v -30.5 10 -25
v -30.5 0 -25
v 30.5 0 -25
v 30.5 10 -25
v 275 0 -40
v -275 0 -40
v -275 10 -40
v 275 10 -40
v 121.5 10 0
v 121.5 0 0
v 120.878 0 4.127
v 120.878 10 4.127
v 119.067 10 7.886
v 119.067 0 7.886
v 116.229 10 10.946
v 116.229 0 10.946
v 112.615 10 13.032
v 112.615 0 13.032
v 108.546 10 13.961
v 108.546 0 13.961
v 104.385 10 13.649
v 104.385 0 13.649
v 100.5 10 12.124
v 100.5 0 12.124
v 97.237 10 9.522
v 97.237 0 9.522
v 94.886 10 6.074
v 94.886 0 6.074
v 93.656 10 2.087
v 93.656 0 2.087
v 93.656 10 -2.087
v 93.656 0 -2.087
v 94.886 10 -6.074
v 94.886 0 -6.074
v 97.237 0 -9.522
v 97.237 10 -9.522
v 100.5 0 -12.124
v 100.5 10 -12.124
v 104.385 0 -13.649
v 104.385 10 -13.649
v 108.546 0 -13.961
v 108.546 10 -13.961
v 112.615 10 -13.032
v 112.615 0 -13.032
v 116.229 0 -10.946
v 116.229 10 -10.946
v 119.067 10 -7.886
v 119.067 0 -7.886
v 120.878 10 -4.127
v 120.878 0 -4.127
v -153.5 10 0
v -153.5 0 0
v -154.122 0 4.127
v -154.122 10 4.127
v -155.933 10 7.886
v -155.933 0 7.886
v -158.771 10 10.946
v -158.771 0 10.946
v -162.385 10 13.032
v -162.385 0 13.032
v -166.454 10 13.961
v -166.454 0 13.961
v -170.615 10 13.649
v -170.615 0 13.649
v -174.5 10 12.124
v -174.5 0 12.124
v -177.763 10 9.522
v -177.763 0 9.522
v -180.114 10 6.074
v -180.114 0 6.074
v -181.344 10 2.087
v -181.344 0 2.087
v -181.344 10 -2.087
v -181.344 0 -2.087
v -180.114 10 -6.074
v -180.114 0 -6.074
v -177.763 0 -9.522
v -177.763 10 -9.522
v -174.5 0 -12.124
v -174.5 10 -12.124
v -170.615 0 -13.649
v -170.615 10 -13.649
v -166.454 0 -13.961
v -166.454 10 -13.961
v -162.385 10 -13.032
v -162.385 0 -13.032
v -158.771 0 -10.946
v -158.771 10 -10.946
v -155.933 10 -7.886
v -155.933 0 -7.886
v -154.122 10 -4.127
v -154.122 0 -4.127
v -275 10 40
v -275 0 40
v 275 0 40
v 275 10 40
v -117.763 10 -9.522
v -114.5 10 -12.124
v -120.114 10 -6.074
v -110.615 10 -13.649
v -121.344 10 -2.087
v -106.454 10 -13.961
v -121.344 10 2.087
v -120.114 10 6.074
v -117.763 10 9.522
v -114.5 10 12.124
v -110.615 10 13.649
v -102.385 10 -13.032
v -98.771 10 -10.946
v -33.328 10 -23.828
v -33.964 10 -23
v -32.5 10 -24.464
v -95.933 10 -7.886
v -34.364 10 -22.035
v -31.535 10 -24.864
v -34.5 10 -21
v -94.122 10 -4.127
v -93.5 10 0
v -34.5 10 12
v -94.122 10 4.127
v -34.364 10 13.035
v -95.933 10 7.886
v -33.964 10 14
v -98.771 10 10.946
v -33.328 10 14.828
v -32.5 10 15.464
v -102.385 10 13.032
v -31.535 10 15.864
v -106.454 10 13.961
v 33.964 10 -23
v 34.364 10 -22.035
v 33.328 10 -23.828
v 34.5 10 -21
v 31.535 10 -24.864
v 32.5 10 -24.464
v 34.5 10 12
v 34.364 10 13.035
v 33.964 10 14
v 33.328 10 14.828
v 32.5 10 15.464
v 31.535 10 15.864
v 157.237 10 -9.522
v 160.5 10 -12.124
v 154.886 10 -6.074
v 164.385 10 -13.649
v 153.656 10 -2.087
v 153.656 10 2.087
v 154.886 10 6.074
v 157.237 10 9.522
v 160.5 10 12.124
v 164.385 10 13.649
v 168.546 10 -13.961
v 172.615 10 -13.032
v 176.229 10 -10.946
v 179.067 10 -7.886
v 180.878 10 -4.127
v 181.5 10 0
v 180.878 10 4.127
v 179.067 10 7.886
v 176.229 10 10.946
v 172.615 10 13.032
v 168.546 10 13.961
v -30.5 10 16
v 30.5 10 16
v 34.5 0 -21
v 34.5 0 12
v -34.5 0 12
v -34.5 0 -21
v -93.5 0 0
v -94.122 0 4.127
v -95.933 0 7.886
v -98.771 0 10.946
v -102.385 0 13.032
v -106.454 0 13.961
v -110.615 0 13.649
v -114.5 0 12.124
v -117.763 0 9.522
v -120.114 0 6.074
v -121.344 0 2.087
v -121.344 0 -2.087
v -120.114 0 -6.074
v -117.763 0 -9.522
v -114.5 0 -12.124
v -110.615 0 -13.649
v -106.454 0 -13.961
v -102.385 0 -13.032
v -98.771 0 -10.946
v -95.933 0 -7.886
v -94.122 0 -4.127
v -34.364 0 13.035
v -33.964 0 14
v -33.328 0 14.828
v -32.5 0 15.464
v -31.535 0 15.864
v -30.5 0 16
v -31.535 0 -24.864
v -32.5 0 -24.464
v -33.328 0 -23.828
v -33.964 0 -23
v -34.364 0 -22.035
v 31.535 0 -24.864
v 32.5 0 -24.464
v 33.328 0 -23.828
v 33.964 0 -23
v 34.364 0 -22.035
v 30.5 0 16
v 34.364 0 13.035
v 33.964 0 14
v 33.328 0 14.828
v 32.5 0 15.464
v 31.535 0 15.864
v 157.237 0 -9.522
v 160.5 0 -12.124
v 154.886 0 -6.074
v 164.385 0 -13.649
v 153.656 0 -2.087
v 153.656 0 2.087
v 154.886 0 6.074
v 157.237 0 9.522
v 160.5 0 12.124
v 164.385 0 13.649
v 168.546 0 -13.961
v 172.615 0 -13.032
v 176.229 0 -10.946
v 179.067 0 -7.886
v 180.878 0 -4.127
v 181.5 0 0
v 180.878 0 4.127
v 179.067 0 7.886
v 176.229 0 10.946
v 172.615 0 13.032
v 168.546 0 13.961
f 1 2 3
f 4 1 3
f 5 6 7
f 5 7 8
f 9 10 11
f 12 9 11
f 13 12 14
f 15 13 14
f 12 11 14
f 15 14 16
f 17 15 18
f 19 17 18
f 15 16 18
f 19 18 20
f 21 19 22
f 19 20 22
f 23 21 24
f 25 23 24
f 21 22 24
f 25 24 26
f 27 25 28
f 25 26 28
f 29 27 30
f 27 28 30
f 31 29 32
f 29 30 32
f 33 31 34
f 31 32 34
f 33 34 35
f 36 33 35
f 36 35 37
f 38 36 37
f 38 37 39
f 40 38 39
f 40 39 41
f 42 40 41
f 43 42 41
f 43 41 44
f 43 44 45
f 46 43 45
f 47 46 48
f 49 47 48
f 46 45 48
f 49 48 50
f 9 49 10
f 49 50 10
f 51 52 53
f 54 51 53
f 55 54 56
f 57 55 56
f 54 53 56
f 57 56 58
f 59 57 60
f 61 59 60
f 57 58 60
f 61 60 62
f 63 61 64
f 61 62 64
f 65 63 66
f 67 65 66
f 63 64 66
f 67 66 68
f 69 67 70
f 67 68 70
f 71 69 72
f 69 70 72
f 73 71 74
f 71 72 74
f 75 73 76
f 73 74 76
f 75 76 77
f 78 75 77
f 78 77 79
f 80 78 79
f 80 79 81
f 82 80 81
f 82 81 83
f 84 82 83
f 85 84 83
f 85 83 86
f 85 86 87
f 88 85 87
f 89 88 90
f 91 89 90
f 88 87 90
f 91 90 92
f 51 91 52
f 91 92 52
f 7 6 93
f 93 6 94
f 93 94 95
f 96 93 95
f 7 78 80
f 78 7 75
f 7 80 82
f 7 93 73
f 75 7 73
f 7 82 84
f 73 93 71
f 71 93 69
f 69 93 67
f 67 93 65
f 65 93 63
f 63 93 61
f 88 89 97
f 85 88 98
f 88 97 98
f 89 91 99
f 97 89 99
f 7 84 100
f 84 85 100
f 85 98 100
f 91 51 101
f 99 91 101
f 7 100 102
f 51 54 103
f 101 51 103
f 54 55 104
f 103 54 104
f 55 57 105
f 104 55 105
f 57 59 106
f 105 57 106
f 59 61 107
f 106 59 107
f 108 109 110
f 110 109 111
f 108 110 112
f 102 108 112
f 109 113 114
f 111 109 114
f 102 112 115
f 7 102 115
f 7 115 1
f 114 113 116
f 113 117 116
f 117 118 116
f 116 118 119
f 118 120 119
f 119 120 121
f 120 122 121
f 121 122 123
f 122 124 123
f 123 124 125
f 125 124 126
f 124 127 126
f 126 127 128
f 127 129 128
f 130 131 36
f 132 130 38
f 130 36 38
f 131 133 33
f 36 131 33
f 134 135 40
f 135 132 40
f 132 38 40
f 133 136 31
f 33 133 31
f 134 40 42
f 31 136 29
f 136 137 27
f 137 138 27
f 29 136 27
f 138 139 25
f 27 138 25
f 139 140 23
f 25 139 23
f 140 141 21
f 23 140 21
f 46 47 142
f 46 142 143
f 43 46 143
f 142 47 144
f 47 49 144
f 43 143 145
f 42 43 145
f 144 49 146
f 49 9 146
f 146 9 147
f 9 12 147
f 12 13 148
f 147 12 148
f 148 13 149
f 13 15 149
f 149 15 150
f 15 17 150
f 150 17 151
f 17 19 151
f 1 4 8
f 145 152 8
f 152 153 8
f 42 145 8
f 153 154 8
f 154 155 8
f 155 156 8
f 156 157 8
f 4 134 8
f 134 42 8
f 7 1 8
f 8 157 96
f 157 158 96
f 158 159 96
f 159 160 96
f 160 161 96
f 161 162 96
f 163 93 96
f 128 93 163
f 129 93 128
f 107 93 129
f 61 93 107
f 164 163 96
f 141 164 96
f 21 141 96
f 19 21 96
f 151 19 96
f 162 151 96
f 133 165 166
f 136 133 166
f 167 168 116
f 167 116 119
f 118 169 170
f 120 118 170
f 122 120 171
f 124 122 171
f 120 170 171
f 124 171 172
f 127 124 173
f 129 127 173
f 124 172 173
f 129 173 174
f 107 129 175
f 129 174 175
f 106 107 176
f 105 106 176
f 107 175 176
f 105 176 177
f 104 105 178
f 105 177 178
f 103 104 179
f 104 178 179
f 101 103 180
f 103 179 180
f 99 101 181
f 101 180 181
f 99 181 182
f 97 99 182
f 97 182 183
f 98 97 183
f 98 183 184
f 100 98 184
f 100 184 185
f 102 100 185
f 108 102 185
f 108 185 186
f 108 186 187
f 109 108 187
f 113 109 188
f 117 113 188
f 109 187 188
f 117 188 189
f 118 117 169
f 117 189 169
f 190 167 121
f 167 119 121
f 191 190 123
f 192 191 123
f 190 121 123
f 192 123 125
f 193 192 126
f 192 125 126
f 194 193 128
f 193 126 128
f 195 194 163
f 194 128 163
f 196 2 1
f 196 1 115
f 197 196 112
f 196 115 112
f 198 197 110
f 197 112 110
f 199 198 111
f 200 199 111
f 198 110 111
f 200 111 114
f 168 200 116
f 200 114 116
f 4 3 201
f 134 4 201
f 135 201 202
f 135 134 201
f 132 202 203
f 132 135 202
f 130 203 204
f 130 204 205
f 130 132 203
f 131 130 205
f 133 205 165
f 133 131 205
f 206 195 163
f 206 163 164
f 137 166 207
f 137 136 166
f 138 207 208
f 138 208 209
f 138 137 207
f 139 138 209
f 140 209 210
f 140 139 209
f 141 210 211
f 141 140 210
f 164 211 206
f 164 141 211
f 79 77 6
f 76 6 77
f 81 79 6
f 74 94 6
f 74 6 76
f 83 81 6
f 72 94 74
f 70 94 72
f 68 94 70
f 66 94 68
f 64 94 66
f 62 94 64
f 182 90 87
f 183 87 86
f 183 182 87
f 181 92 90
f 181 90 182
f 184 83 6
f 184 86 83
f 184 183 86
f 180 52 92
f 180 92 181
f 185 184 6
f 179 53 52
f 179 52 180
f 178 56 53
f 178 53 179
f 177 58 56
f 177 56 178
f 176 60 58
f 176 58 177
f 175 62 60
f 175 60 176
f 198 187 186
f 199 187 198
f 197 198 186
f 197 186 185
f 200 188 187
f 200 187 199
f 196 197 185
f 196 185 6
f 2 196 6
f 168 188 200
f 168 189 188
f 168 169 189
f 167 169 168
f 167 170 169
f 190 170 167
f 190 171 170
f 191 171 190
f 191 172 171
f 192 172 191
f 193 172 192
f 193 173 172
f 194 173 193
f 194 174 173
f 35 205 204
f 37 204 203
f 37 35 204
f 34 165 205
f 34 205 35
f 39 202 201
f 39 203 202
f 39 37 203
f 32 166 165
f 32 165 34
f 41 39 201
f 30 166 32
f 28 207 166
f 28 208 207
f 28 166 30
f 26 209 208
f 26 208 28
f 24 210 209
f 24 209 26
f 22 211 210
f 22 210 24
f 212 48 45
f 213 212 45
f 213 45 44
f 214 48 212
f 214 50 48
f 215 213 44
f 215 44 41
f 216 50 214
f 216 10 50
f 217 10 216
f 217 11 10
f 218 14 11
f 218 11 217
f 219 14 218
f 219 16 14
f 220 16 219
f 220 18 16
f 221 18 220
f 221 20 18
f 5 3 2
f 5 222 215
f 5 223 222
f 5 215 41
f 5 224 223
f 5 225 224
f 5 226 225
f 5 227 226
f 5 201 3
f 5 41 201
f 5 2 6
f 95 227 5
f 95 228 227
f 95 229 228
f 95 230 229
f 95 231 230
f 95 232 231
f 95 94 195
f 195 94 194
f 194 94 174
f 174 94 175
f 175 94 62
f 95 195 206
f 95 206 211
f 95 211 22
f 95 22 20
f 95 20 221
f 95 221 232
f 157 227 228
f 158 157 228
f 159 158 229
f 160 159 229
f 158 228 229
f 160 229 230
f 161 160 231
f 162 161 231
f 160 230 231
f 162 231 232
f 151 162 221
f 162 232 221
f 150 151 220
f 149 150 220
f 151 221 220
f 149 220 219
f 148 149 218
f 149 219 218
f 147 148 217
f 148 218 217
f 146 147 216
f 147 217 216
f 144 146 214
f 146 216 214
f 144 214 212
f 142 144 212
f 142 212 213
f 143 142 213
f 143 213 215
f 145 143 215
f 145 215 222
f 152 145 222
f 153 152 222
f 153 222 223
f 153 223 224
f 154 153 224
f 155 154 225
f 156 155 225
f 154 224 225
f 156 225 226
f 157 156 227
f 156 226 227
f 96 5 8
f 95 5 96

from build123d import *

# Parameters (mm, degrees)
F0_W     = 550
F0_H     = 80
F0_W_2   = 69
F0_H_2   = 41
F0_R     = 14
F1_DEPTH = 10
F2_R     = 4


with BuildPart() as f1:
    # F0 (on Front) → F1 (new body)
    with BuildSketch(Plane.XZ):
        Rectangle(F0_W, F0_H)
        with Locations((0, -4.5)):
            Rectangle(F0_W_2, F0_H_2, mode=Mode.SUBTRACT)
        with Locations((-167.5, 0)):
            Circle(F0_R, mode=Mode.SUBTRACT)
        with Locations((-107.5, 0)):
            Circle(F0_R, mode=Mode.SUBTRACT)
        with Locations((107.5, 0)):
            Circle(F0_R, mode=Mode.SUBTRACT)
        with Locations((167.5, 0)):
            Circle(F0_R, mode=Mode.SUBTRACT)
    extrude(amount=-F1_DEPTH)

    # F2
    f2_edges = [f1.edges().sort_by_distance(p)[0] for p in [
        (-34.5, 5, 16),
        (34.5, 5, 16),
        (34.5, 5, -25),
        (-34.5, 5, -25),
    ]]
    fillet(f2_edges, radius=F2_R)


solid = f1.part
